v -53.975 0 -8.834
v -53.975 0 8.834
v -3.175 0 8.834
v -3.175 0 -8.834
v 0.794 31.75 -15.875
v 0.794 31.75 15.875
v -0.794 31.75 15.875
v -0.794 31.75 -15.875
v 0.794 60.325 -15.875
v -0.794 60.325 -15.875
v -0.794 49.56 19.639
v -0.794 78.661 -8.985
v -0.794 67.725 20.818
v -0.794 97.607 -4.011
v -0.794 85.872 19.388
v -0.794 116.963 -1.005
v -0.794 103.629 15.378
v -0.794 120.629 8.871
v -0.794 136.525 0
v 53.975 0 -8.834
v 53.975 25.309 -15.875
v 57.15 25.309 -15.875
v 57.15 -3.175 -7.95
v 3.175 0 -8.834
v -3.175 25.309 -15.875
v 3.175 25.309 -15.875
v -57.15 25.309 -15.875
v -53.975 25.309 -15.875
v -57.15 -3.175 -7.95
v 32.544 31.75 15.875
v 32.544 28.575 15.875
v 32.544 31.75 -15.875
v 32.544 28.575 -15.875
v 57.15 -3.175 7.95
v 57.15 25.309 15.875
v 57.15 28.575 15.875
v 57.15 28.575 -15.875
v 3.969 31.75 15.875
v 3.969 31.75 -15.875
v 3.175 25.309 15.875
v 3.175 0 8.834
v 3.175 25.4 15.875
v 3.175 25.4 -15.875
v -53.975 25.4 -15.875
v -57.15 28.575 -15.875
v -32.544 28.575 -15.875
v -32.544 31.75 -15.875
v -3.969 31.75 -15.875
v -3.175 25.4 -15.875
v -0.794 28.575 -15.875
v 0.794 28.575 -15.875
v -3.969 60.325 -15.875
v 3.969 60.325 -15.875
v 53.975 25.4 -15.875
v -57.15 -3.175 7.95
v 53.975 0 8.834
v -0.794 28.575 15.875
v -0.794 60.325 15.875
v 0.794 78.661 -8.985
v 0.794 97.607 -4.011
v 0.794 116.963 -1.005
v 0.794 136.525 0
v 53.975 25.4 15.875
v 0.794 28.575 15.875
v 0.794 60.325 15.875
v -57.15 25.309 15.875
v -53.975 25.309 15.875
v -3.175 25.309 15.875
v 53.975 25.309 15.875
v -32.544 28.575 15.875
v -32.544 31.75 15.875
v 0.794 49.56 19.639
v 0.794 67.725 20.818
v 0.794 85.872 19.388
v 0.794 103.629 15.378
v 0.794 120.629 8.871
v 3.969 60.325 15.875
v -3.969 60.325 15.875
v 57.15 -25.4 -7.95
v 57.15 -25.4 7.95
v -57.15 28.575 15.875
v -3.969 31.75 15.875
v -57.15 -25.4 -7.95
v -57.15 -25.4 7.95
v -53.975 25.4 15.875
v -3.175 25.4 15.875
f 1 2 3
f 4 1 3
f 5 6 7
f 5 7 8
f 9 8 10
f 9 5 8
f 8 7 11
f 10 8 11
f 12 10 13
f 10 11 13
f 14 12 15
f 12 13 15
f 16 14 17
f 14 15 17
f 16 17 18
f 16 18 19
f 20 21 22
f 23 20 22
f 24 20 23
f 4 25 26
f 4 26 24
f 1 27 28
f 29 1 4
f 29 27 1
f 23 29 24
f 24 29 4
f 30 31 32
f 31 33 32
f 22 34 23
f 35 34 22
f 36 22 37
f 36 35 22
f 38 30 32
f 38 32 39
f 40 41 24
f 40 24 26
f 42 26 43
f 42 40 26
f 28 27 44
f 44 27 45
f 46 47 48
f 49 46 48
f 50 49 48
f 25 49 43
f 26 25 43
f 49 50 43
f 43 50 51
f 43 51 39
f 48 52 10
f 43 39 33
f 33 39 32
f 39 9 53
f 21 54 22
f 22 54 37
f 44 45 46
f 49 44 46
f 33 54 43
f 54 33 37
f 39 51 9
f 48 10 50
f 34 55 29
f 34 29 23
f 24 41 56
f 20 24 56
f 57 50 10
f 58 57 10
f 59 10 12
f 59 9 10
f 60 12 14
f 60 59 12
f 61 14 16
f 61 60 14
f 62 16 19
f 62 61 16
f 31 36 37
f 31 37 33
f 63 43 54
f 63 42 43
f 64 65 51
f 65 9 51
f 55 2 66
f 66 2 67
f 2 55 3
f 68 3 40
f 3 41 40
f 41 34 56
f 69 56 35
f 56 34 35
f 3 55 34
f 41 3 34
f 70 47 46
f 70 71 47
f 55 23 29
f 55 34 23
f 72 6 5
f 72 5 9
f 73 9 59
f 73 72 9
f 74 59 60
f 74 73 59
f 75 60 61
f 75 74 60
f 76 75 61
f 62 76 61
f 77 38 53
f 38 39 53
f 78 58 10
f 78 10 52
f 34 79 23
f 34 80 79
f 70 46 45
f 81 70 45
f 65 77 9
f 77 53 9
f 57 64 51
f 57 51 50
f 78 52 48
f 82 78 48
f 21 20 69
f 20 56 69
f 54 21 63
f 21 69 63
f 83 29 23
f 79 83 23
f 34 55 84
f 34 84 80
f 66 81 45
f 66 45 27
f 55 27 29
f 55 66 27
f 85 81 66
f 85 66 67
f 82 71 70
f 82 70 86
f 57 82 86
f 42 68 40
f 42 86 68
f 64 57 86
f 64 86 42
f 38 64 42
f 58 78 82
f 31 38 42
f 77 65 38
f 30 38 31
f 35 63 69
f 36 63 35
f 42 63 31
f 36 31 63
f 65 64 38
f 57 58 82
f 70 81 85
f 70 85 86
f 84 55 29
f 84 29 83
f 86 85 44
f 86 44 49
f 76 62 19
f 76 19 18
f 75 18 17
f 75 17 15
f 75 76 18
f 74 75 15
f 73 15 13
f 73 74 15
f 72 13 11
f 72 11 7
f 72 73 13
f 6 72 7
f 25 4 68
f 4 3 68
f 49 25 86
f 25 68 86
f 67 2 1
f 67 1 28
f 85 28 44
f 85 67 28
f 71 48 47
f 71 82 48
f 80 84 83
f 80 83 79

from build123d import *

# Parameters (mm, degrees)
F0_W          = 50.8
F0_H          = 25.4
F1_DEPTH      = 15.875
F1_DEPTH_BACK = 15.875
F2_DEPTH      = 7.9502
F2_DEPTH_BACK = 7.9502
F3_DEPTH      = 15.875
F3_DEPTH_BACK = 15.875
F7_DEPTH      = 57.15
F7_DEPTH_BACK = 57.15
F9_DEPTH      = 0.79375
F9_DEPTH_BACK = 0.79375


# Not quite as in the source:
# - the program builds the solid bodies; features that only make, move or delete a surface that nothing else refers to are left out


with BuildPart() as f1:
    # F0 (on Top) → F1 (new body, two sides)
    with BuildSketch(Plane.XY) as f1_sk:
        Polygon((-57.15, -3.175), (0, -3.175), (57.15, -3.175), (57.15, 28.575), (32.54375, 28.575), (0.79375, 28.575), (-0.79375, 28.575), (-32.54375, 28.575), (-57.15, 28.575), align=None)
        with Locations((-28.575, 12.7)):
            Rectangle(F0_W, F0_H, mode=Mode.SUBTRACT)
        with Locations((28.575, 12.7)):
            Rectangle(F0_W, F0_H, mode=Mode.SUBTRACT)
    extrude(amount=F1_DEPTH)
    extrude(f1_sk.sketch, amount=-F1_DEPTH_BACK)

    # F0 (on Top) → F3 (join, two sides)
    with BuildSketch(Plane.XY) as f3_sk:
        Polygon((-32.54375, 31.75), (-32.54375, 28.575), (-0.79375, 28.575), (-0.79375, 60.325), (-3.96875, 60.325), (-3.96875, 31.75), align=None)
        Polygon((0.79375, 28.575), (32.54375, 28.575), (32.54375, 31.75), (3.96875, 31.75), (3.96875, 60.325), (0.79375, 60.325), align=None)
    extrude(amount=F3_DEPTH)
    extrude(f3_sk.sketch, amount=-F3_DEPTH_BACK)

    # F6 (on Right) → F7 (cut, two sides)
    with BuildSketch(Plane.YZ) as f7_sk:
        Polygon((25.4, -15.9004), (-3.175, -7.9502), (-3.175, -15.9004), align=None)
        Polygon((-3.175, 15.9004), (-3.175, 7.9502), (25.4, 15.9004), align=None)
    extrude(amount=-F7_DEPTH, mode=Mode.SUBTRACT)
    extrude(f7_sk.sketch, amount=F7_DEPTH_BACK, mode=Mode.SUBTRACT)


with BuildPart() as f2:
    # F0 (on Top) → F2 (new body, two sides)
    with BuildSketch(Plane.XY) as f2_sk:
        Polygon((57.15, -3.175), (0, -3.175), (-57.15, -3.175), (-57.15, -25.4), (57.15, -25.4), align=None)
    extrude(amount=F2_DEPTH)
    extrude(f2_sk.sketch, amount=-F2_DEPTH_BACK)


with BuildPart() as f9:
    # F8 (on Right) → F9 (new body, two sides)
    with BuildSketch(Plane.YZ) as f9_sk:
        with BuildLine():
            ThreePointArc((60.325, -15.875), (97.606959116, -4.0109037567), (136.525, 0))
            ThreePointArc((136.525, 0), (85.8723958548, 19.3878126418), (31.75, 15.875))
            Line((31.75, 15.875), (31.75, -15.875))
            Line((31.75, -15.875), (60.325, -15.875))
        make_face()
    extrude(amount=F9_DEPTH)
    extrude(f9_sk.sketch, amount=-F9_DEPTH_BACK)


solid = Compound([f1.part, f2.part, f9.part])
